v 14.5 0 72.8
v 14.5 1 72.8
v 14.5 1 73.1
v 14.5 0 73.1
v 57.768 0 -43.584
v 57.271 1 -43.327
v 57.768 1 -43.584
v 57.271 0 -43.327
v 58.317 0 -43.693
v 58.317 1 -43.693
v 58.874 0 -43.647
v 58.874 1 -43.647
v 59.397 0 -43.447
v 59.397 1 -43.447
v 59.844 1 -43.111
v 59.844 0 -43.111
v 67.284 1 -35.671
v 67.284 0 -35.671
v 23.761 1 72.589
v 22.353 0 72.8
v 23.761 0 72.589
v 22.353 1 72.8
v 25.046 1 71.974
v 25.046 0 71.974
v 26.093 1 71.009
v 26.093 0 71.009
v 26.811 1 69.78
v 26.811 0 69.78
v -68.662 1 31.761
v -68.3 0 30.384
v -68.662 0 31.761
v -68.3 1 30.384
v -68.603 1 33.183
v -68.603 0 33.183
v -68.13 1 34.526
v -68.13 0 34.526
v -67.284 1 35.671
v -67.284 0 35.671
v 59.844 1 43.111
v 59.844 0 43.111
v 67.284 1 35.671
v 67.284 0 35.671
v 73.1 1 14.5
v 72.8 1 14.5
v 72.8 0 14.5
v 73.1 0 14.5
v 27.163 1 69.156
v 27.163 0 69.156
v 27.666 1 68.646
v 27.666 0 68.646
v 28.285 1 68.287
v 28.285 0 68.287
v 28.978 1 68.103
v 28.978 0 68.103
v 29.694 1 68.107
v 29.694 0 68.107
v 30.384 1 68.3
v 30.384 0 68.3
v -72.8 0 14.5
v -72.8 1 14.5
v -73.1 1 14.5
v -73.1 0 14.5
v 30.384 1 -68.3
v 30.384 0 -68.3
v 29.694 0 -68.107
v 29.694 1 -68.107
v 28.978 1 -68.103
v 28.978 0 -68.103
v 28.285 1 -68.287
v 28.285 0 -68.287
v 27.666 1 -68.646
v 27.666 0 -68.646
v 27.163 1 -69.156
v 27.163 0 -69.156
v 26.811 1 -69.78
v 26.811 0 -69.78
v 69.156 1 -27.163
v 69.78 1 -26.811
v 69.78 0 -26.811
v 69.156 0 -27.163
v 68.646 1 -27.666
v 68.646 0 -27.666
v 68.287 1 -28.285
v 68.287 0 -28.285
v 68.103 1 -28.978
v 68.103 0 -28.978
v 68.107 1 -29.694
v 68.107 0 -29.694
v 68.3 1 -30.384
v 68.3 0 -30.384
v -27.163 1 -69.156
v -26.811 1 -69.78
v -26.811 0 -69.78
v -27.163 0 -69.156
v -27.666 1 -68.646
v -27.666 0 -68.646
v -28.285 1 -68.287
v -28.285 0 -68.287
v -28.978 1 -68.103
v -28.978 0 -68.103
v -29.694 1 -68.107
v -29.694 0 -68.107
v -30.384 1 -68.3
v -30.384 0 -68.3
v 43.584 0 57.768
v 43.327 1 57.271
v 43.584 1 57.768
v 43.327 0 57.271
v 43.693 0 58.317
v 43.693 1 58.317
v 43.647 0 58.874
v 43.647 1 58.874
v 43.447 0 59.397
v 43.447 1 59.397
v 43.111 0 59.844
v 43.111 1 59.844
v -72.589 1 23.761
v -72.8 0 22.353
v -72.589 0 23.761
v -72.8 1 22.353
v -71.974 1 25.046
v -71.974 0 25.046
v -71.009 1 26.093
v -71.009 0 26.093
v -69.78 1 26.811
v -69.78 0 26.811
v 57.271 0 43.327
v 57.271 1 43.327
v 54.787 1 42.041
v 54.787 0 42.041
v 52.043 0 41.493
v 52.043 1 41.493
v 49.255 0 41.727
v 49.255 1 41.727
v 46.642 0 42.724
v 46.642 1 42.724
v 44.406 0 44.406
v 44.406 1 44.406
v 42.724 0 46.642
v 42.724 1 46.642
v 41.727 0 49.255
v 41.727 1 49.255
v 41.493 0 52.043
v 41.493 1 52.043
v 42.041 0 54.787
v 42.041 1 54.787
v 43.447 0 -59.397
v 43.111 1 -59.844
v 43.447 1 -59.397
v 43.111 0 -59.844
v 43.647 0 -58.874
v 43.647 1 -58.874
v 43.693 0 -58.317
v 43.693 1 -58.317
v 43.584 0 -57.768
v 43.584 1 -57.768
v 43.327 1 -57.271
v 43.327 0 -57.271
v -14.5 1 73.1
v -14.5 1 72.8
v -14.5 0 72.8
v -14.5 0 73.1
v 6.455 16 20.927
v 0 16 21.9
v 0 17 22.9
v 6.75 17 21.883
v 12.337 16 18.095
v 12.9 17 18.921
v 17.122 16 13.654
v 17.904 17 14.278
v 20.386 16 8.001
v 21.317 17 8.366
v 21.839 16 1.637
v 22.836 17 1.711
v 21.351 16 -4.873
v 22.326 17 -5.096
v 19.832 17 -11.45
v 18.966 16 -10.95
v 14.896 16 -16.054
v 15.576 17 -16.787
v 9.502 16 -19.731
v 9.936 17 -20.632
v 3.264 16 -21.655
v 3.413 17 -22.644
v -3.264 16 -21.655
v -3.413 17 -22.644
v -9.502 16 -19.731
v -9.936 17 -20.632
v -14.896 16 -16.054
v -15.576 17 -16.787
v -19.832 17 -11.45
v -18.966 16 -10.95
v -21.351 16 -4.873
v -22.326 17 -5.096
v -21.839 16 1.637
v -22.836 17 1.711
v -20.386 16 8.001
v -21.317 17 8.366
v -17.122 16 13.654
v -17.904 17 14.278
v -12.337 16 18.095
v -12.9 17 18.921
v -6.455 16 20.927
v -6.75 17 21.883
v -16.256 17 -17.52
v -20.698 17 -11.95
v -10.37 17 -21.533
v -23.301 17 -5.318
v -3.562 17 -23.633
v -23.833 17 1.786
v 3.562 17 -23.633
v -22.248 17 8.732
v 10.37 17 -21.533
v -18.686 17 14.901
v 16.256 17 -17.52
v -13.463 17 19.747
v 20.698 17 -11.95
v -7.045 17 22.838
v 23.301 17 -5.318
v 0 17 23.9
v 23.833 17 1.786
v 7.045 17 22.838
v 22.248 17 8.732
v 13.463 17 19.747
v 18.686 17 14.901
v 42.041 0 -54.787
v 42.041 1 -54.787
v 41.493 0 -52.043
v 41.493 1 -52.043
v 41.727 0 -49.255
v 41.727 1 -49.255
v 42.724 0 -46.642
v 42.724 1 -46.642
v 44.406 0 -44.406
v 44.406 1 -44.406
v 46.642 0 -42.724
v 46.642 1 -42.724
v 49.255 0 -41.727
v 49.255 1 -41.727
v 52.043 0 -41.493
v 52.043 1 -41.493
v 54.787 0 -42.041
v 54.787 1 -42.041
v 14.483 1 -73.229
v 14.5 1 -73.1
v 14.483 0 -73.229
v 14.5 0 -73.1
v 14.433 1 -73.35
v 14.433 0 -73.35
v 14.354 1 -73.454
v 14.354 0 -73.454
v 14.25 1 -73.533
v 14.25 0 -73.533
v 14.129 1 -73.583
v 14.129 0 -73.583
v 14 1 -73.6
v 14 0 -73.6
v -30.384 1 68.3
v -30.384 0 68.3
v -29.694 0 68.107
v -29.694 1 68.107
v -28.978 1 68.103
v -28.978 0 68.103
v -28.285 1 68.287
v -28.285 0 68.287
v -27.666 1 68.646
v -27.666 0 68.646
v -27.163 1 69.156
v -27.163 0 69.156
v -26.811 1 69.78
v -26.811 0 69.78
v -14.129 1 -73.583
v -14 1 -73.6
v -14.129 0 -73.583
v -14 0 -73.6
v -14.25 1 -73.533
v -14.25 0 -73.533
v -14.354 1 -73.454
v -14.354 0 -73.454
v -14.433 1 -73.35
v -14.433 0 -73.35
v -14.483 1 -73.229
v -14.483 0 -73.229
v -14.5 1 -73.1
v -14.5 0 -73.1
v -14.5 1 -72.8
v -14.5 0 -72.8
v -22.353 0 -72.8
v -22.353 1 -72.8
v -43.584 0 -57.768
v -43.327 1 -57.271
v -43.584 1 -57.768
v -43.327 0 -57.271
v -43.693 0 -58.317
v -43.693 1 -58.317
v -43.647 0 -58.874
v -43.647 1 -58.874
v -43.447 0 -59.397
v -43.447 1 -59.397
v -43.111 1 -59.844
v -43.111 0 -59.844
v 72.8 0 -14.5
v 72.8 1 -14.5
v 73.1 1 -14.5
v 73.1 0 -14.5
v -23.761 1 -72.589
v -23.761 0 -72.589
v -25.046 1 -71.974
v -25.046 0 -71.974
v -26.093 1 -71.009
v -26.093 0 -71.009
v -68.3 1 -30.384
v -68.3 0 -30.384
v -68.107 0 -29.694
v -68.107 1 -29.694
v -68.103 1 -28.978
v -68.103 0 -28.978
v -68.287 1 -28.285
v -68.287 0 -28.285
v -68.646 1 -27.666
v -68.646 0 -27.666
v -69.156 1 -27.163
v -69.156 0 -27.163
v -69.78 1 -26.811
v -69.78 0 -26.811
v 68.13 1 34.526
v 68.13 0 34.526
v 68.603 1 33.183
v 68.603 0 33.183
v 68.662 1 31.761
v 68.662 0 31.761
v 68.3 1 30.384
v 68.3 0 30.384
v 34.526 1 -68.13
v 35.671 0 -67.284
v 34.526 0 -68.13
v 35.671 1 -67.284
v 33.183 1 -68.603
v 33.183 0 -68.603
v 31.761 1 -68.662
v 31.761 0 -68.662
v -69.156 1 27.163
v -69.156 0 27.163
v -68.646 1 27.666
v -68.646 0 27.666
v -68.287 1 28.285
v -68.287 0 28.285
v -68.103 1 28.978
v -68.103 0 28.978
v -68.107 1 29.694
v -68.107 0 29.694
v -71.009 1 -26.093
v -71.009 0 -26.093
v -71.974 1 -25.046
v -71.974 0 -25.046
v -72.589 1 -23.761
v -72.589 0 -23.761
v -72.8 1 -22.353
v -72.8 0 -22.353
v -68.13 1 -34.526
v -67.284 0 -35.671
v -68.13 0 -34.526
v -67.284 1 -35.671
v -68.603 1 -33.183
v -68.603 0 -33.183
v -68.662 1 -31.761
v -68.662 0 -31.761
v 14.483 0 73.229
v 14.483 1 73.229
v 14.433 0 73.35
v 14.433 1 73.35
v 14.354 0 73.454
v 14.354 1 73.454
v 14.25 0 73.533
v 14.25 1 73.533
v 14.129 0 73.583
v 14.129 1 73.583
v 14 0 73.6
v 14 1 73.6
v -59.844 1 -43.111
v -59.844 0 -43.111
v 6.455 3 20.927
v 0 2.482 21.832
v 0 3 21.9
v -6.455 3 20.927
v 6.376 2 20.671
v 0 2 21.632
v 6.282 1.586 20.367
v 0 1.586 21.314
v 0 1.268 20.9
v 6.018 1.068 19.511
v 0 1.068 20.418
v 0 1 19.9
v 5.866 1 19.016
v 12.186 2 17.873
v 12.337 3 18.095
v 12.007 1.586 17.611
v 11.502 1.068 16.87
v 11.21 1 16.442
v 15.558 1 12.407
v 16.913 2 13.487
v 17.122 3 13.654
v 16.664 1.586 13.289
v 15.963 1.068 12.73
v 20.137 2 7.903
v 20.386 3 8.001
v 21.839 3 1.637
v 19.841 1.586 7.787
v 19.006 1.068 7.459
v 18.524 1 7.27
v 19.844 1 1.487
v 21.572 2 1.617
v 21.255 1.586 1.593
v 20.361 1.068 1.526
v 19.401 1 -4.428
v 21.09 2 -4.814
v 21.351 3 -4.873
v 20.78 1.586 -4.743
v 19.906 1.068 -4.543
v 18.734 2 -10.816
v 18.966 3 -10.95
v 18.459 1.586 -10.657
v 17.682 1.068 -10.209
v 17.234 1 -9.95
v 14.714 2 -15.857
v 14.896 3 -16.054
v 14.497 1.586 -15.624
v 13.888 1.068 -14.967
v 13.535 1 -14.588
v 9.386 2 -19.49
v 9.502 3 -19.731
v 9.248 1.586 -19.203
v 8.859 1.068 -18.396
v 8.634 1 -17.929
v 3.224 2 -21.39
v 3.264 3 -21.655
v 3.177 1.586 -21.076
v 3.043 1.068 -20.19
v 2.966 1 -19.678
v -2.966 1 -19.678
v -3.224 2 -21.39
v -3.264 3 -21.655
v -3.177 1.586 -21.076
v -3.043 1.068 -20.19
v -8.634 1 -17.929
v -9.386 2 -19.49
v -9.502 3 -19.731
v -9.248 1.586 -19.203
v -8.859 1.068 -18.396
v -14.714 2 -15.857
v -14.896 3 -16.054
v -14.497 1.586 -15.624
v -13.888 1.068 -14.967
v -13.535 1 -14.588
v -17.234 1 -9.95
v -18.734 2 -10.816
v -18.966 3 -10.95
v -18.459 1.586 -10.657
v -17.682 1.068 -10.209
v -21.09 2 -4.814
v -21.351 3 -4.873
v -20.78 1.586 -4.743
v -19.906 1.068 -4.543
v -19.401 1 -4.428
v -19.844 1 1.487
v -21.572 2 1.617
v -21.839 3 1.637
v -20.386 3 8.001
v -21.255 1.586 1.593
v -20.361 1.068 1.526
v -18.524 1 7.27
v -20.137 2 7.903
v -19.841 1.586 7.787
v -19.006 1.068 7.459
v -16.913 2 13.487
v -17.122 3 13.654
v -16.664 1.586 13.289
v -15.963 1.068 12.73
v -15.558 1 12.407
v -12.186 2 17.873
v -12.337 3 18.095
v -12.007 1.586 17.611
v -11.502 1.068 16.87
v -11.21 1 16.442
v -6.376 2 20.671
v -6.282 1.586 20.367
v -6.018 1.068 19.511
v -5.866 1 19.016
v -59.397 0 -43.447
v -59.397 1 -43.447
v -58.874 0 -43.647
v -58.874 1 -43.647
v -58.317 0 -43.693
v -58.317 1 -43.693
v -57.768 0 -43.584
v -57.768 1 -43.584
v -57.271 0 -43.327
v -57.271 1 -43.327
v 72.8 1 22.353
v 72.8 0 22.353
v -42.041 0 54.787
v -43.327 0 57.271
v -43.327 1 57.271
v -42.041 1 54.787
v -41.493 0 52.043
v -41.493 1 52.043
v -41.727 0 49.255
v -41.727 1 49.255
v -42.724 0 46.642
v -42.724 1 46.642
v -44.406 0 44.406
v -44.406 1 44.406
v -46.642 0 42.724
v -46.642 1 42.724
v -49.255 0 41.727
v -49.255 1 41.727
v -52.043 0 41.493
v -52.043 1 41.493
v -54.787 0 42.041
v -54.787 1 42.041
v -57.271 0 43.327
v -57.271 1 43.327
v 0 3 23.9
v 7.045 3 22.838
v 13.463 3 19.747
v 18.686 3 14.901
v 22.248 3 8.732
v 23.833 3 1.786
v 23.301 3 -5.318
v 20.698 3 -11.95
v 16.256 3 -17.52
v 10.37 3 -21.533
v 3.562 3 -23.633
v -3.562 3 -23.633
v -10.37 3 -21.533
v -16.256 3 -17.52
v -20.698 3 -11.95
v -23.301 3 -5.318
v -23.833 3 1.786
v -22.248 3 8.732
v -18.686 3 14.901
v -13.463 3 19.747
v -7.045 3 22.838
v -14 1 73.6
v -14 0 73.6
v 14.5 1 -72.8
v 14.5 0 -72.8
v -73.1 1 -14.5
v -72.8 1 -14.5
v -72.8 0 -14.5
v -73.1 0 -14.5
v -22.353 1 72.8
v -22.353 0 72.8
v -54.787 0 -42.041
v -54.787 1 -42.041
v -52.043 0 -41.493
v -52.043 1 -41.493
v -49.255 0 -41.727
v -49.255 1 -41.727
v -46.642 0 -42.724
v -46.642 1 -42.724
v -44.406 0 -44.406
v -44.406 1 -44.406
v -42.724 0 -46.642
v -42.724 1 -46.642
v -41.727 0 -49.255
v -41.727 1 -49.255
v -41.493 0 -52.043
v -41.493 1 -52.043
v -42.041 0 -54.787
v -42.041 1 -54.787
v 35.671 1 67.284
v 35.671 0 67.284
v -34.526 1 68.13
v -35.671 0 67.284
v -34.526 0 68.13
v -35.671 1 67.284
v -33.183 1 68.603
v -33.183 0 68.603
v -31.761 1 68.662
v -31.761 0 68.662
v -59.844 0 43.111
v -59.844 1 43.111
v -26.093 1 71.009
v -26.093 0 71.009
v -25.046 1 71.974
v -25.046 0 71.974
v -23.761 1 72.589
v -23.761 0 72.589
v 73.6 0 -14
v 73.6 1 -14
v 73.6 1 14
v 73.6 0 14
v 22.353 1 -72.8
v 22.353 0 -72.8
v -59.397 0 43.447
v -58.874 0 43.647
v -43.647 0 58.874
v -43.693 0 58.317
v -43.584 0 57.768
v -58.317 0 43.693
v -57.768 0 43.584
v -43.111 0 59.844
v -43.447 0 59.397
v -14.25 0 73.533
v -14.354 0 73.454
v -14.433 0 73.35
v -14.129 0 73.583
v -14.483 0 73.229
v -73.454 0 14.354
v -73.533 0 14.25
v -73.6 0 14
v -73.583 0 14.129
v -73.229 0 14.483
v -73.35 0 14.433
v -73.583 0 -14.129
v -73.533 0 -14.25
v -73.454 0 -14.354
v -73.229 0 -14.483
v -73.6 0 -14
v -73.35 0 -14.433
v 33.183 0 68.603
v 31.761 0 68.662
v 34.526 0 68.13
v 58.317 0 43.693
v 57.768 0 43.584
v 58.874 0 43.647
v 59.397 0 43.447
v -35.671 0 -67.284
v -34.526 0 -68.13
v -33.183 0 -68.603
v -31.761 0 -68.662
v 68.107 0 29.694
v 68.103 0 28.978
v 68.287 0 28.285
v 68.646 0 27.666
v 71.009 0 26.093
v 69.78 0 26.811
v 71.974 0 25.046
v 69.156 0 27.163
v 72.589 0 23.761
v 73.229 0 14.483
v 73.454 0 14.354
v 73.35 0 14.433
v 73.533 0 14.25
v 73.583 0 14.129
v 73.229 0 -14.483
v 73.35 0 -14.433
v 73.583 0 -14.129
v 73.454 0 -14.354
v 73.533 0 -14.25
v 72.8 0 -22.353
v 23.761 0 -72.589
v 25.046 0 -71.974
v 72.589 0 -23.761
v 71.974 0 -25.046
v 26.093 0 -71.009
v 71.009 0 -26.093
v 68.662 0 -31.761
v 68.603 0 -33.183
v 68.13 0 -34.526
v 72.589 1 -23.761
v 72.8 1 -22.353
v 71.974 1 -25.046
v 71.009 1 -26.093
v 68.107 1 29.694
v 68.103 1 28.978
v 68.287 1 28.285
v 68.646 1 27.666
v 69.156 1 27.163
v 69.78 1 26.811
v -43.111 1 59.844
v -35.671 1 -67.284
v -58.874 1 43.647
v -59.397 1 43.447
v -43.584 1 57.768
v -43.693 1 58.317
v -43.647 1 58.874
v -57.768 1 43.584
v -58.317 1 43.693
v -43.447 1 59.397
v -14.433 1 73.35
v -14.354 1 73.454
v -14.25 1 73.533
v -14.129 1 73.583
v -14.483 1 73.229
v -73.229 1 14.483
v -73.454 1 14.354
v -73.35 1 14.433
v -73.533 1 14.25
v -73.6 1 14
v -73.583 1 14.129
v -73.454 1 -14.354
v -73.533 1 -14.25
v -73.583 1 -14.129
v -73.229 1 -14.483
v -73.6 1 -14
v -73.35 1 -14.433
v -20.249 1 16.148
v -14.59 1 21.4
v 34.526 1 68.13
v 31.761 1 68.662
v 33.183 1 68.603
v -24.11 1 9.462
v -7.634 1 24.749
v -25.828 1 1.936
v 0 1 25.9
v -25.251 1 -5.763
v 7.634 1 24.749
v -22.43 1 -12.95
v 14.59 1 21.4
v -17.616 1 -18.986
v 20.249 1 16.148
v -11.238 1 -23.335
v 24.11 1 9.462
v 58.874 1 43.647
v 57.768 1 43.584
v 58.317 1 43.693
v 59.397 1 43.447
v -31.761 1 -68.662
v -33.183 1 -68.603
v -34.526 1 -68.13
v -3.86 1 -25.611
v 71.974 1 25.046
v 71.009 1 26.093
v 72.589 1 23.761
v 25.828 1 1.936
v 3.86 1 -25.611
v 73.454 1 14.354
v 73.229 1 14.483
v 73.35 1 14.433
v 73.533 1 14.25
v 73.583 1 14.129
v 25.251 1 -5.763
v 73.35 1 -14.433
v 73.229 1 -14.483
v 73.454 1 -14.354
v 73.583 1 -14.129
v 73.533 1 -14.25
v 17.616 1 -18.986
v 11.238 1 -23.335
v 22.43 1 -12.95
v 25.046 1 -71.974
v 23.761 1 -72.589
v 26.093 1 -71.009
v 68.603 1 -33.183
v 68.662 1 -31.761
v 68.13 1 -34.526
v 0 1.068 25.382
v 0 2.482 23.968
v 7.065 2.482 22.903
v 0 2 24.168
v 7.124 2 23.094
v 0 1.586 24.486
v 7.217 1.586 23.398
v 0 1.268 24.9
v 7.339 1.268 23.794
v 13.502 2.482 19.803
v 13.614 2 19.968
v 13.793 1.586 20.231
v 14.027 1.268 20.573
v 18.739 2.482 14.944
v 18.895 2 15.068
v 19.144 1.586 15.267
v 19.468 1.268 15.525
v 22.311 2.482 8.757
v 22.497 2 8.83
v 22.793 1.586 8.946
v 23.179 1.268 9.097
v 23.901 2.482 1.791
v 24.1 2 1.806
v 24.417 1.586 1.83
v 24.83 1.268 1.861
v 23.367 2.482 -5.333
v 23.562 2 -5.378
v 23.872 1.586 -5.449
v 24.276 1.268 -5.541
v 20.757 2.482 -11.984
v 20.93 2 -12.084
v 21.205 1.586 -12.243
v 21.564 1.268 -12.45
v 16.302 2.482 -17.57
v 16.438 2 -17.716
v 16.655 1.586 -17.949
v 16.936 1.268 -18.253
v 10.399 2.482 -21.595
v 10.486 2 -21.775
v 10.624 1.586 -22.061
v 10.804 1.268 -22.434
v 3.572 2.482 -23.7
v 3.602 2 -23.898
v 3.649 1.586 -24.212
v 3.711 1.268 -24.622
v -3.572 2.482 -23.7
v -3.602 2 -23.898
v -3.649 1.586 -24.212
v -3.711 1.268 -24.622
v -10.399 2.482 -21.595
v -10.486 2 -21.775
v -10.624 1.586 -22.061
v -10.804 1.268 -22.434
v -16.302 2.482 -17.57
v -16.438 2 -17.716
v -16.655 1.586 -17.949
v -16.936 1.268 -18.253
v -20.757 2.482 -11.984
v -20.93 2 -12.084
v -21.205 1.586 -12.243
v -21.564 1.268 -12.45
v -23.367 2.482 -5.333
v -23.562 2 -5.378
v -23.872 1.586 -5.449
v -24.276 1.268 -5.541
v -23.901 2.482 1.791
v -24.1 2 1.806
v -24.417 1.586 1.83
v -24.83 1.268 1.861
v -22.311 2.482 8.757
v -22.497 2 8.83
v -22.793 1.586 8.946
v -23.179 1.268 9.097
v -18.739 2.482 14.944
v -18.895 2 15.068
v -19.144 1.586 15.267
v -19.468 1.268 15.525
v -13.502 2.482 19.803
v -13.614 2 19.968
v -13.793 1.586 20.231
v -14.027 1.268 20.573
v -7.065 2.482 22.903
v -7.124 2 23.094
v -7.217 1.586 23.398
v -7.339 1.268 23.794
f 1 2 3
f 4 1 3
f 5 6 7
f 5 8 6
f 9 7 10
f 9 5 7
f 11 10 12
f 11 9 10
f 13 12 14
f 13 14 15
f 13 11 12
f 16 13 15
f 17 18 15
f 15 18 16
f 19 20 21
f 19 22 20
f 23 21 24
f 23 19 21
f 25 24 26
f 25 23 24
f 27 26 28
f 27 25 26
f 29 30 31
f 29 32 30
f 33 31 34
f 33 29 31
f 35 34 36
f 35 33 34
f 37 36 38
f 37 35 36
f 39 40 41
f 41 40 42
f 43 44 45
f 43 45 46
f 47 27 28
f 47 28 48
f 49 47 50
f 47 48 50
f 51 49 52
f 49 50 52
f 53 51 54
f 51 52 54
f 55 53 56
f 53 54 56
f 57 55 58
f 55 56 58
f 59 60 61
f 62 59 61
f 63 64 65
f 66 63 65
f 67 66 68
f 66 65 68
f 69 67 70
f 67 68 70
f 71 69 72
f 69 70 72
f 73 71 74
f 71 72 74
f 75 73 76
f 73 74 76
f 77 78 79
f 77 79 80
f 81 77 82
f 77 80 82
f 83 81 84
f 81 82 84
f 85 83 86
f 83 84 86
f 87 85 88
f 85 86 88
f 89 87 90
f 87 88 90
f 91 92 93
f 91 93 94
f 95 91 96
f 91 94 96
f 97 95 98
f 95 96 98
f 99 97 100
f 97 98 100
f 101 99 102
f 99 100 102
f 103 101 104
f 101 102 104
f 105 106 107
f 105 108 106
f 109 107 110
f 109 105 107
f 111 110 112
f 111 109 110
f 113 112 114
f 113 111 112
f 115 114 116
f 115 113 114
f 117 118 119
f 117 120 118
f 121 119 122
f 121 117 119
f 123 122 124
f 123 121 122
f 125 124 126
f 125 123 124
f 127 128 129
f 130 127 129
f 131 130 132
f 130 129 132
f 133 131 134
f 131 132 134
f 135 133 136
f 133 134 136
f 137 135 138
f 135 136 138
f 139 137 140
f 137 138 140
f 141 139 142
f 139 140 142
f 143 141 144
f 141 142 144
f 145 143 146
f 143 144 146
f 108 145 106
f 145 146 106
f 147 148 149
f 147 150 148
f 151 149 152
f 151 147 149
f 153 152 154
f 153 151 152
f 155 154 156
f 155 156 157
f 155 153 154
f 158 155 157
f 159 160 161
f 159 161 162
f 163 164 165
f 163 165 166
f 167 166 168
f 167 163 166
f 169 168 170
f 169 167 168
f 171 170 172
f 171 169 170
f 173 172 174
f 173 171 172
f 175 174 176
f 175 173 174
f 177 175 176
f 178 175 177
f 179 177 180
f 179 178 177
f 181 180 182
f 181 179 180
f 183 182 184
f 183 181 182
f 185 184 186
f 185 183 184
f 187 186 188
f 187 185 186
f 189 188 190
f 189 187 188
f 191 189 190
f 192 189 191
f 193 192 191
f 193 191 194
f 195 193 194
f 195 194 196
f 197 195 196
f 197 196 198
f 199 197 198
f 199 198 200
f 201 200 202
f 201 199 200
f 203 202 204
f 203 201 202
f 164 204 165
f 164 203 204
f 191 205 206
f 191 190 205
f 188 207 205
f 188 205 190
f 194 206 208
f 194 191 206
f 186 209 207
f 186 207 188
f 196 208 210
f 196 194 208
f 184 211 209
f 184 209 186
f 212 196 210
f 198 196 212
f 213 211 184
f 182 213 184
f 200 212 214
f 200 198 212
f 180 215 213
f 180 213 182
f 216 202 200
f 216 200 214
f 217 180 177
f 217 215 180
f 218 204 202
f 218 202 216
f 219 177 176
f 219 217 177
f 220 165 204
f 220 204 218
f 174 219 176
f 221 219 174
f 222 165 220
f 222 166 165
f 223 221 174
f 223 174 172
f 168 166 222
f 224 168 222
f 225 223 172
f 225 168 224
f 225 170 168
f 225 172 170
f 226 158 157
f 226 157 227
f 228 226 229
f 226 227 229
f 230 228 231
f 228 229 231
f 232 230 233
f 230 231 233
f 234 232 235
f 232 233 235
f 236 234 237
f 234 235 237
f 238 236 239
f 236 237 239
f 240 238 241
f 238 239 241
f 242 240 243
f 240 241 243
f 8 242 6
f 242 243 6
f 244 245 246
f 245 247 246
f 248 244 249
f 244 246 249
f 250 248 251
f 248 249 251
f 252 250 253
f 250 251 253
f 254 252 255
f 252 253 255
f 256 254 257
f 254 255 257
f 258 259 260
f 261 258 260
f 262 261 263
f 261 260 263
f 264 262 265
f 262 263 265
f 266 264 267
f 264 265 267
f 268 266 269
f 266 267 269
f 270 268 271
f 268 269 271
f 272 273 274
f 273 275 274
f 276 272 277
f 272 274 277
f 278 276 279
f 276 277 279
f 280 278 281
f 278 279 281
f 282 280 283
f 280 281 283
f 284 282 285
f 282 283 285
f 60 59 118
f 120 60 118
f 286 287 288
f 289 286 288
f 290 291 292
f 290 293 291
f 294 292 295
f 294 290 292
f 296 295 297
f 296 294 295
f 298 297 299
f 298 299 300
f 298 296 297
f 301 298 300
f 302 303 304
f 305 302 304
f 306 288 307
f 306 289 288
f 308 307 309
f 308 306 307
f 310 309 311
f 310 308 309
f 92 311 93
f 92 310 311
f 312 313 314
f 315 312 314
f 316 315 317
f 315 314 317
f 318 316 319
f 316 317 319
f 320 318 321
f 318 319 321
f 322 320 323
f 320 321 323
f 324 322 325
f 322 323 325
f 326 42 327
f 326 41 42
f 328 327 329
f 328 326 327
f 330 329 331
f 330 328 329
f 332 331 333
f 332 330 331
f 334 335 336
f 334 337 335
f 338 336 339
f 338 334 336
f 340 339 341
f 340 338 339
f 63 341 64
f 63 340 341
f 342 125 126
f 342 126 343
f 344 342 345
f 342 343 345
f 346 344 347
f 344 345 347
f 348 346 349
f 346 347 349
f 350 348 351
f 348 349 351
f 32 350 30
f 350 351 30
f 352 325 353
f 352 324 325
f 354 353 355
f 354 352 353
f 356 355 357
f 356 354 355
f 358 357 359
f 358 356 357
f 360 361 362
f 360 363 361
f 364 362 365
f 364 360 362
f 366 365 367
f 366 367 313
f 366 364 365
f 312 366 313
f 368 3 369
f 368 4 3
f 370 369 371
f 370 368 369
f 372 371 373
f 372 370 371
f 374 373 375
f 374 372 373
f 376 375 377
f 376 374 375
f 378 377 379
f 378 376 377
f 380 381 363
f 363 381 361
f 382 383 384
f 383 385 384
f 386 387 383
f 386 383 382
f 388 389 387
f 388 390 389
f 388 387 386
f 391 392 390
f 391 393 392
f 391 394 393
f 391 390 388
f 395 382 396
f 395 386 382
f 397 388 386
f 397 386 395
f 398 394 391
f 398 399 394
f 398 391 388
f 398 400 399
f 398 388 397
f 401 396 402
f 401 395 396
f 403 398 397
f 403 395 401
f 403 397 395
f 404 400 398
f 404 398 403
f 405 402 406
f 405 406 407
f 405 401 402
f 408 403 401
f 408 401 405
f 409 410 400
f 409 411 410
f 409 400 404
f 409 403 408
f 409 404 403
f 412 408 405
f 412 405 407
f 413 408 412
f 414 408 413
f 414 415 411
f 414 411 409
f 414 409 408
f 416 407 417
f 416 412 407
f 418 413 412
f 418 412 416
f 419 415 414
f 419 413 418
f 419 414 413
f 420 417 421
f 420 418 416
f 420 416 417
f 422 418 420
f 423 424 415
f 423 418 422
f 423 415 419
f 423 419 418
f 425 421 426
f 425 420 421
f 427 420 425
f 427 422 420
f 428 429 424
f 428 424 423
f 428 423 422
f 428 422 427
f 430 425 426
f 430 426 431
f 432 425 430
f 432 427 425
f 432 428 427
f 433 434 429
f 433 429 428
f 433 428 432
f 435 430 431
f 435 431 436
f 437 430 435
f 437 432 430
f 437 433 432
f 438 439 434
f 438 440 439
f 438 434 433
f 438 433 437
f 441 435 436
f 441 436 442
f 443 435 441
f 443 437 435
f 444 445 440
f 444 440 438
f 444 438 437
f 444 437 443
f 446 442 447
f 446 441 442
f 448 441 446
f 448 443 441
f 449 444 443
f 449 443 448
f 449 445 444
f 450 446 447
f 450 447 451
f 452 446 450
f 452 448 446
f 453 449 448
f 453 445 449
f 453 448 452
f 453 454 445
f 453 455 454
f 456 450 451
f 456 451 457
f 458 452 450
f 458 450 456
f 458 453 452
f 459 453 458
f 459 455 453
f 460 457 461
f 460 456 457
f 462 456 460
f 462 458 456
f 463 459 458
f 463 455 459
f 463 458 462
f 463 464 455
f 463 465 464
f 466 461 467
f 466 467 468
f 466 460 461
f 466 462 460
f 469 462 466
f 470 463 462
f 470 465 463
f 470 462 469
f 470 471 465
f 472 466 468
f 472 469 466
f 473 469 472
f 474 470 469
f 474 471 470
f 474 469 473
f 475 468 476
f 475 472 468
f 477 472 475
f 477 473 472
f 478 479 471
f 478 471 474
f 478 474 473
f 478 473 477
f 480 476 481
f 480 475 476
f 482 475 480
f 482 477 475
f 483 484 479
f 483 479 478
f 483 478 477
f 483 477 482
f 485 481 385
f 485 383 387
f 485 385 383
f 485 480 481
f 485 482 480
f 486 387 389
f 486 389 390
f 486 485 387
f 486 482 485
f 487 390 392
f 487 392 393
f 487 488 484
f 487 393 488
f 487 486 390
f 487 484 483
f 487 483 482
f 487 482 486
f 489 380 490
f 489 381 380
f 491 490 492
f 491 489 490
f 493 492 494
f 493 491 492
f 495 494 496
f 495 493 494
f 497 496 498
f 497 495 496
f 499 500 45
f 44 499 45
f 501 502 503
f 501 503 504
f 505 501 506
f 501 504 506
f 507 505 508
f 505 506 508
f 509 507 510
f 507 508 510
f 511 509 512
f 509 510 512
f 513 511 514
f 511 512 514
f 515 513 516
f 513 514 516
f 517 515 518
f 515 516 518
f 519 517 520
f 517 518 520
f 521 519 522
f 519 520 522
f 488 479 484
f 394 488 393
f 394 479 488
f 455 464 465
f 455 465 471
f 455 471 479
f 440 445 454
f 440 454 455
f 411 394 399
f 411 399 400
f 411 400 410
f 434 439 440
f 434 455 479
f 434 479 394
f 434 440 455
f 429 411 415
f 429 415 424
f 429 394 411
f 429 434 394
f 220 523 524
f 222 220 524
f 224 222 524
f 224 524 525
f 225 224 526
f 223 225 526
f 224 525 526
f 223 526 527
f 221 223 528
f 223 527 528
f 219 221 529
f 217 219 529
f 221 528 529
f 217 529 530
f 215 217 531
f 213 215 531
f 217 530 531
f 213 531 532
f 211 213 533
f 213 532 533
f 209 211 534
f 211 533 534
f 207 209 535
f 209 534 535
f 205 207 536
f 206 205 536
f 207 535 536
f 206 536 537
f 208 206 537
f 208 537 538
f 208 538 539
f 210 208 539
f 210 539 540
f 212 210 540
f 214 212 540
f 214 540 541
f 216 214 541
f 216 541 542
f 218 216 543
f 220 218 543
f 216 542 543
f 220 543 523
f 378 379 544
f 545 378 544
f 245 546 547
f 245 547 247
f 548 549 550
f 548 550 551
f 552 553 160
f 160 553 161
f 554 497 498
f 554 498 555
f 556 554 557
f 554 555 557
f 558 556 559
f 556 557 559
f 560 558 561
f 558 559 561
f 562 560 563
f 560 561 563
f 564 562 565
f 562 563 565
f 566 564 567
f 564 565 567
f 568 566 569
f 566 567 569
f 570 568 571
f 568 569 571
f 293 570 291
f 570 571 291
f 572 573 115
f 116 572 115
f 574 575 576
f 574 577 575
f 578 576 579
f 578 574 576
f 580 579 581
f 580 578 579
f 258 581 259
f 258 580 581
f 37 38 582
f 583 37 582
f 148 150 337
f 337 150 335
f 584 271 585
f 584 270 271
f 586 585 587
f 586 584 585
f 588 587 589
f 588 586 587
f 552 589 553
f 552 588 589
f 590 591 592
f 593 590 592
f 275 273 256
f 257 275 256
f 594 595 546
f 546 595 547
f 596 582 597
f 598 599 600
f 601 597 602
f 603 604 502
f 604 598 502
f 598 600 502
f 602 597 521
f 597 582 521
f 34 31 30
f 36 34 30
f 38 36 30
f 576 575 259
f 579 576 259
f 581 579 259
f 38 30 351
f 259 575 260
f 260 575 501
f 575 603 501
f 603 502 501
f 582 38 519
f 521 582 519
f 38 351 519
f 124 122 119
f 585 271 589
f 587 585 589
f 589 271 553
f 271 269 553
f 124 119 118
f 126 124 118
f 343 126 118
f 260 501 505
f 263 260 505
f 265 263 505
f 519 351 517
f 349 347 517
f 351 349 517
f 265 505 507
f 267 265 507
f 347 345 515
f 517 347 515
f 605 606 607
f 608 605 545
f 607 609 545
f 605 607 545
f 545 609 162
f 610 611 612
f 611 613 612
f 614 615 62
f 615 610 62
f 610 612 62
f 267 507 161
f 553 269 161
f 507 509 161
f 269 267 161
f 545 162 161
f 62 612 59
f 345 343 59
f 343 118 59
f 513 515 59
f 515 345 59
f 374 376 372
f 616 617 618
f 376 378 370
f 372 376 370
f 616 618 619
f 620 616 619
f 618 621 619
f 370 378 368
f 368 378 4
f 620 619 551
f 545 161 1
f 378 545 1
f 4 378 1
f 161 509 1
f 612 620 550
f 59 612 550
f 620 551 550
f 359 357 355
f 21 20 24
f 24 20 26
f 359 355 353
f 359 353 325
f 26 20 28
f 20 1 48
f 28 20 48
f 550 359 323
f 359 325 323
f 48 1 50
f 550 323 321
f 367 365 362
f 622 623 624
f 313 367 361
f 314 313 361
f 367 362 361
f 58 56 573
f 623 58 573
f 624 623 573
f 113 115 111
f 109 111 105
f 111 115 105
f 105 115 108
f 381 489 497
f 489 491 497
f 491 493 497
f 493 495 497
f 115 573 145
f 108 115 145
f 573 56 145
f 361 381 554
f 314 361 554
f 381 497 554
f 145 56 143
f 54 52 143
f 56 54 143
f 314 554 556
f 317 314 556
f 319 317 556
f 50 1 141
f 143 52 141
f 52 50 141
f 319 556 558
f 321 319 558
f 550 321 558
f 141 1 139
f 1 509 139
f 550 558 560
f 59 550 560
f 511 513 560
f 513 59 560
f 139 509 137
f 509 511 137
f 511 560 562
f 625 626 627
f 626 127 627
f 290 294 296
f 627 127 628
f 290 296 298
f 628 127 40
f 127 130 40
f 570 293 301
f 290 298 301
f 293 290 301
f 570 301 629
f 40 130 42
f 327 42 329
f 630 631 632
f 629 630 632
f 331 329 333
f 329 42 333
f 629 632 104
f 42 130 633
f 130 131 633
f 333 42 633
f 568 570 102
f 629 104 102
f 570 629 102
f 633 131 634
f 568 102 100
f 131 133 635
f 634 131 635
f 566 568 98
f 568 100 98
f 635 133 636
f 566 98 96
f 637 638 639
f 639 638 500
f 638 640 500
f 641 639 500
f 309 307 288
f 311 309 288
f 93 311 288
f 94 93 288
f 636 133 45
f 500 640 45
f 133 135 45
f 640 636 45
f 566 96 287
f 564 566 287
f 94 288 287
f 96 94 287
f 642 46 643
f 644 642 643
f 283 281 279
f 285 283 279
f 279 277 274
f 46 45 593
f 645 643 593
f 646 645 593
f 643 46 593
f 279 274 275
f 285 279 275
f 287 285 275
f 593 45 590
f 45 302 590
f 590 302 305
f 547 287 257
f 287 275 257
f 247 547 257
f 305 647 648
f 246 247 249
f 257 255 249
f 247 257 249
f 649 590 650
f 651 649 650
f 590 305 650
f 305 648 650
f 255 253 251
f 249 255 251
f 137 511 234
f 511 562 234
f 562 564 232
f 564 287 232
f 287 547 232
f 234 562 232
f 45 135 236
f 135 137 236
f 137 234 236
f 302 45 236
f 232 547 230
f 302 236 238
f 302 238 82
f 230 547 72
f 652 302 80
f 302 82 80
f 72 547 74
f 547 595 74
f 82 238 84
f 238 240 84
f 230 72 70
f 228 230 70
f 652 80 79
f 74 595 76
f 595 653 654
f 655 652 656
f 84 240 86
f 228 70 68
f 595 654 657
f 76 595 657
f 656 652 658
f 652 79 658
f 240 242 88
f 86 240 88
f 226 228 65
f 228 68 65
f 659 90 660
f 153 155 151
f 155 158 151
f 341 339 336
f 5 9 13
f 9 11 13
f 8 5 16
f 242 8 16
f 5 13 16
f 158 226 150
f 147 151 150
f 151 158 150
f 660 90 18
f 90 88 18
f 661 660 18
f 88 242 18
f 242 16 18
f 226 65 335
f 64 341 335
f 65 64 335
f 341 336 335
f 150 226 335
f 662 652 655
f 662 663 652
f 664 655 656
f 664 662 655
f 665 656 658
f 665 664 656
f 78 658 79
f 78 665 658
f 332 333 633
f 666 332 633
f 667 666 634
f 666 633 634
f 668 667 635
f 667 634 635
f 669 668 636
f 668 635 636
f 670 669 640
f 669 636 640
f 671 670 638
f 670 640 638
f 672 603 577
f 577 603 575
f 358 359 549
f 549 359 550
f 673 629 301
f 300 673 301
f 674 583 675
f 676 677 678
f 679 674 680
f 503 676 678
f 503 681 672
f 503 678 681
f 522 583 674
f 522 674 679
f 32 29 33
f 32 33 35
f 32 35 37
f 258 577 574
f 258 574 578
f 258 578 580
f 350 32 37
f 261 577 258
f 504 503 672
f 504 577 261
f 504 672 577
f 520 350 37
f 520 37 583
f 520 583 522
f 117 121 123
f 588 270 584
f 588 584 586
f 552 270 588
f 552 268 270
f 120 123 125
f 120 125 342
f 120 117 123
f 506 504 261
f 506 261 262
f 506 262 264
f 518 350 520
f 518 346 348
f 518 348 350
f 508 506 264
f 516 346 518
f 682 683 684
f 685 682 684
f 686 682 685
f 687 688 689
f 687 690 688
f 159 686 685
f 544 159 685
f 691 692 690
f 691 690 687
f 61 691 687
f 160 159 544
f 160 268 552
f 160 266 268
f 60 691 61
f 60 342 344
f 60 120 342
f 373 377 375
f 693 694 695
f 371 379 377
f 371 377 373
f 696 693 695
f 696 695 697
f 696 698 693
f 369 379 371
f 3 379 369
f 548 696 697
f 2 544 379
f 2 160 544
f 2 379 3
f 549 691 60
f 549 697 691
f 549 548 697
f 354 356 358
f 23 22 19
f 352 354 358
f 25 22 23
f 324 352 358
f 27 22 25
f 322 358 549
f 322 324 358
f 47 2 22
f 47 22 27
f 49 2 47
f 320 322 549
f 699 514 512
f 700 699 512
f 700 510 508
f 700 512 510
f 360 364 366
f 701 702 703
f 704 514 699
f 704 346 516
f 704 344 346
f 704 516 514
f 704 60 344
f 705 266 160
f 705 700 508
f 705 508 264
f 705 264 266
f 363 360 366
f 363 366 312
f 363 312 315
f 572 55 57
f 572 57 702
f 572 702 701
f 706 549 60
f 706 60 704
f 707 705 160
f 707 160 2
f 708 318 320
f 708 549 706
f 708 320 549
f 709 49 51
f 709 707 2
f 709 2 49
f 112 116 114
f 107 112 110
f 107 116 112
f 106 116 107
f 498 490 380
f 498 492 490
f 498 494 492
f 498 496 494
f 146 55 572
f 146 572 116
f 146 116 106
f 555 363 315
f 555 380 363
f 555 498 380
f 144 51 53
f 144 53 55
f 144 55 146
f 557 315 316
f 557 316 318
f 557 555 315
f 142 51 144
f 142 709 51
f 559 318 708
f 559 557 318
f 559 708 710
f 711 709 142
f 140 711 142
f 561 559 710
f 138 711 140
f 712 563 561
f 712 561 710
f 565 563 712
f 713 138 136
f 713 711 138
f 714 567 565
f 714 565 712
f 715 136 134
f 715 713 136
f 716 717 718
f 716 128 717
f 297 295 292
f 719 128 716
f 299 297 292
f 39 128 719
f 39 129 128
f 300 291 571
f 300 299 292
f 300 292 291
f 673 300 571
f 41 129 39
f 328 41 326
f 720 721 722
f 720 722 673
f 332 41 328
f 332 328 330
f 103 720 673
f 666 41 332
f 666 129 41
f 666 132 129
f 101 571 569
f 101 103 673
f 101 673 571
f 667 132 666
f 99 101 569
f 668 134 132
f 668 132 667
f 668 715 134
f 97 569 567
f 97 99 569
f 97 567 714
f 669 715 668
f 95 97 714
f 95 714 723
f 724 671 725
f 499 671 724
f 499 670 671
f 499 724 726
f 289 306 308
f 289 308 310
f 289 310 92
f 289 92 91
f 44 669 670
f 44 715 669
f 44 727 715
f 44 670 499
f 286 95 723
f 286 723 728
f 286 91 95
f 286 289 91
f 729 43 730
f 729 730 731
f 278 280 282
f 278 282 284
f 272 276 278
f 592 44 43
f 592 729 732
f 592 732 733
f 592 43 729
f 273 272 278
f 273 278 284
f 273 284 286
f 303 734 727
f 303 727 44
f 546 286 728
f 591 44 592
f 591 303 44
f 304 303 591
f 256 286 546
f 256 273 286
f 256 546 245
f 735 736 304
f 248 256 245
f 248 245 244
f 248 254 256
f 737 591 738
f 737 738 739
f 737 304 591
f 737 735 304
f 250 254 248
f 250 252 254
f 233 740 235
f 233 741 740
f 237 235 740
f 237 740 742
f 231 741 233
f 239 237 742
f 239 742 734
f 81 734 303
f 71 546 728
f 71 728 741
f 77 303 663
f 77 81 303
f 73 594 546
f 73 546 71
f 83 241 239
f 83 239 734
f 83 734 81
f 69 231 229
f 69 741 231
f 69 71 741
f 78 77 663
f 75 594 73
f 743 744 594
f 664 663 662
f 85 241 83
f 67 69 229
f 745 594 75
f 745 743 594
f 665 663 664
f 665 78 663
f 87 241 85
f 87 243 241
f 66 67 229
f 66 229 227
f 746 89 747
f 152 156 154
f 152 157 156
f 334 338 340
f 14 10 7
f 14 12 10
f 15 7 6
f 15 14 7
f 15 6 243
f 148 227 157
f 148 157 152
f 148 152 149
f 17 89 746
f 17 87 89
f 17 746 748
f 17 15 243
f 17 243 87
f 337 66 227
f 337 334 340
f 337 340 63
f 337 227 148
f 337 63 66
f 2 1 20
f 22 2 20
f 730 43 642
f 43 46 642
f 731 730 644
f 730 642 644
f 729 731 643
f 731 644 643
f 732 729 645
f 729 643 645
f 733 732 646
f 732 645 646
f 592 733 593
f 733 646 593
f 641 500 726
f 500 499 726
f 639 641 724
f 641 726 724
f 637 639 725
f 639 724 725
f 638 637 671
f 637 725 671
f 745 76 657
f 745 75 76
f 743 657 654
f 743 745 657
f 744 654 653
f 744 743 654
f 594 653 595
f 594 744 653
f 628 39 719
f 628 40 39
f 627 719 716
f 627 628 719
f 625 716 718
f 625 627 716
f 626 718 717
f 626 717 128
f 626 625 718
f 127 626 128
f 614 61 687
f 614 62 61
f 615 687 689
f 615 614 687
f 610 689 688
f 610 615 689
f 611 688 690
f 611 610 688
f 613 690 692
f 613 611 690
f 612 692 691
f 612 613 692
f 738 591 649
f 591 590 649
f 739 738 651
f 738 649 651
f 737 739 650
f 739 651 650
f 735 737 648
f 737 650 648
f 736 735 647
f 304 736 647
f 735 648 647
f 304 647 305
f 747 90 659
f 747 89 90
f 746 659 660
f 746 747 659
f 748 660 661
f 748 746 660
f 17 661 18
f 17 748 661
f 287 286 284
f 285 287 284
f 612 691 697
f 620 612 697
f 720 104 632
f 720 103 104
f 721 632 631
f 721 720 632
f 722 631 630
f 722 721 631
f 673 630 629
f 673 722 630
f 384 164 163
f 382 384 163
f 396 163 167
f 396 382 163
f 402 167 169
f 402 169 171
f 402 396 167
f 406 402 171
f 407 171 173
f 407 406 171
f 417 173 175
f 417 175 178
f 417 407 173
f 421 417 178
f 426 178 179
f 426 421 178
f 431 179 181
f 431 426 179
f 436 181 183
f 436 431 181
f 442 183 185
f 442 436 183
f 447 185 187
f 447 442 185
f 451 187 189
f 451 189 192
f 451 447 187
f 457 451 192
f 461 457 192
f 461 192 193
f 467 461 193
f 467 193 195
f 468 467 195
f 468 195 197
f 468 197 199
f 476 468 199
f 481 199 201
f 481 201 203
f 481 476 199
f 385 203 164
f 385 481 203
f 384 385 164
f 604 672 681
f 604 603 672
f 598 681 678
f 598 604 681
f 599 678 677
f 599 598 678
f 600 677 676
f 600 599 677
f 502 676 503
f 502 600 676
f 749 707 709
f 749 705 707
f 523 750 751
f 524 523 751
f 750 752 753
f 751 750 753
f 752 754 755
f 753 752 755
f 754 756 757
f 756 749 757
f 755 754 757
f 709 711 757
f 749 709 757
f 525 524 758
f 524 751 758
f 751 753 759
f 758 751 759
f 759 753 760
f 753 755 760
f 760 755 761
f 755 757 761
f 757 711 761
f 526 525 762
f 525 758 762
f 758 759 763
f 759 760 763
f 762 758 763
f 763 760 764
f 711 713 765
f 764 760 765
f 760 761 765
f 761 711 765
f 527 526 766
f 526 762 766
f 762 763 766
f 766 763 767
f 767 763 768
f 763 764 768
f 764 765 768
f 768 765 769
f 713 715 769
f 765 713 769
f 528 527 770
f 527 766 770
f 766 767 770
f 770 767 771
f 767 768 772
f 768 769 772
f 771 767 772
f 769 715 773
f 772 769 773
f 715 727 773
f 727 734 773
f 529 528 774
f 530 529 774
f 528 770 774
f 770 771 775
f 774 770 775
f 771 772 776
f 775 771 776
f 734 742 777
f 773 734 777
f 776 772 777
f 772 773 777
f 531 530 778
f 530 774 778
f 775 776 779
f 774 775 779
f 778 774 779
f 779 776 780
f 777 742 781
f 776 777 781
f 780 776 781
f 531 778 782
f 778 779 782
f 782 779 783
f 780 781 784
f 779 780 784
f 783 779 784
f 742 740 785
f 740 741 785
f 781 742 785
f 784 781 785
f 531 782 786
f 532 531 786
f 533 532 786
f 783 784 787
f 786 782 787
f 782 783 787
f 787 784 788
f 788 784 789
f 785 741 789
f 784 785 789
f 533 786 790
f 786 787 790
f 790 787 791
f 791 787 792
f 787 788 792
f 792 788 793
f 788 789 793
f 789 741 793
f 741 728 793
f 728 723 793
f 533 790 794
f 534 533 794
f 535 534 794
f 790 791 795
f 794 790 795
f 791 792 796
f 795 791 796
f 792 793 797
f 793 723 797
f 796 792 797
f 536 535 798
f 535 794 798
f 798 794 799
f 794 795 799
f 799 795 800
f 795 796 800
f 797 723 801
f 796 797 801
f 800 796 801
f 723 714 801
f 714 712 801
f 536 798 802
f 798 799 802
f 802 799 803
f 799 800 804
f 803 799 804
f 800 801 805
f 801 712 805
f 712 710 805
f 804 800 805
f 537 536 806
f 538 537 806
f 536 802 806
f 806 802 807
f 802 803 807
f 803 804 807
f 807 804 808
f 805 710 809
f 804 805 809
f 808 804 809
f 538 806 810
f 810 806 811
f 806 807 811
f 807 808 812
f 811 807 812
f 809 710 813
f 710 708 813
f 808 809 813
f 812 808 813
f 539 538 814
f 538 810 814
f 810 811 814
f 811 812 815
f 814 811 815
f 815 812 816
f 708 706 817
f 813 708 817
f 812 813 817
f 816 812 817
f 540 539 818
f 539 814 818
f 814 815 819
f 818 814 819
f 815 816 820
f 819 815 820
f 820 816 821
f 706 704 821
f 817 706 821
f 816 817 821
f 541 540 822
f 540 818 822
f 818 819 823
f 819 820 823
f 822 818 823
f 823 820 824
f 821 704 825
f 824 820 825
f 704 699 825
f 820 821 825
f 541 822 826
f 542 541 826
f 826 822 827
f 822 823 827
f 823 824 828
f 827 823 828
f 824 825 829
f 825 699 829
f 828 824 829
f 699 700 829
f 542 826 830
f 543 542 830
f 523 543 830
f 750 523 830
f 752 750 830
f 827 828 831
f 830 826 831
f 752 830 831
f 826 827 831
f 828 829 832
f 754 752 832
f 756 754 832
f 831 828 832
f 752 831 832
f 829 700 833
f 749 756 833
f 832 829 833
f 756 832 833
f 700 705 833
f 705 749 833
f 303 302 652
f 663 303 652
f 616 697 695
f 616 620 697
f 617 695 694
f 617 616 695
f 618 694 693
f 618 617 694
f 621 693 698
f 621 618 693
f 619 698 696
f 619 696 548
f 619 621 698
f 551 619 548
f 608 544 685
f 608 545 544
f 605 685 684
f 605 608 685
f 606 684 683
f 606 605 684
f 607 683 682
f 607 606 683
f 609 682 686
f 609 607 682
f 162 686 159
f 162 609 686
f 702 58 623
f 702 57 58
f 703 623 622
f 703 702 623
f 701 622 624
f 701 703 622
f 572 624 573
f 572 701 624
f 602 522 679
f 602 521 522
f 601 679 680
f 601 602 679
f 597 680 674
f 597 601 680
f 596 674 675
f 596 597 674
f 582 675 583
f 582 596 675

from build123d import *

# Parameters (mm, degrees)
BOSS_EXTRUDE1_DEPTH = 1
FILLET2_R           = 4.8
SKETCH5_W           = 29
SKETCH5_H           = 0.8
BOSS_EXTRUDE2_DEPTH = 1
CUT_EXTRUDE1_REACH  = 105.527
CIRPATTERN1_COUNT   = 4
SKETCH6_R           = 23.9
SKETCH6_R_2         = 21.9
BOSS_EXTRUDE3_DEPTH = 16
FILLET6_R           = 2
CHAMFER1_SIZE       = 1
FILLET5_R           = 2
FILLET7_R           = 0.5


with BuildPart() as part:
    # Sketch4 → Boss-Extrude1 (new body)
    with BuildSketch(Plane(origin=(0, 0, 0), x_dir=(1, 0, 0), z_dir=(0, 1, 0))):
        with BuildLine():
            Line((72.8, -27.525603906), (72.8, 27.525603906))
            ThreePointArc((72.8, 27.525603906), (68.286783321, 28.285311783), (70.940914849, 32.013832492))
            Line((70.940914849, 32.013832492), (32.013832492, 70.940914849))
            ThreePointArc((32.013832492, 70.940914849), (28.285311783, 68.286783321), (27.525603906, 72.8))
            Line((27.525603906, 72.8), (-27.525603906, 72.8))
            ThreePointArc((-27.525603906, 72.8), (-28.285311783, 68.286783321), (-32.013832492, 70.940914849))
            Line((-32.013832492, 70.940914849), (-70.940914849, 32.013832492))
            ThreePointArc((-70.940914849, 32.013832492), (-68.286783321, 28.285311783), (-72.8, 27.525603906))
            Line((-72.8, 27.525603906), (-72.8, -27.525603906))
            ThreePointArc((-72.8, -27.525603906), (-68.286783321, -28.285311783), (-70.940914849, -32.013832492))
            Line((-70.940914849, -32.013832492), (-32.013832492, -70.940914849))
            ThreePointArc((-32.013832492, -70.940914849), (-28.285311783, -68.286783321), (-27.525603906, -72.8))
            Line((-27.525603906, -72.8), (27.525603906, -72.8))
            ThreePointArc((27.525603906, -72.8), (28.285311783, -68.286783321), (32.013832492, -70.940914849))
            Line((32.013832492, -70.940914849), (70.940914849, -32.013832492))
            ThreePointArc((70.940914849, -32.013832492), (68.286783321, -28.285311783), (72.8, -27.525603906))
        make_face()
    extrude(amount=BOSS_EXTRUDE1_DEPTH)

    # Fillet2
    fillet2_edges = [part.edges().sort_by_distance(p)[0] for p in [
        (27.525603906, 0.5, 72.8),
        (-27.525603906, 0.5, 72.8),
        (-32.013832492, 0.5, 70.940914849),
        (-70.940914849, 0.5, 32.013832492),
        (-72.8, 0.5, 27.525603906),
        (-72.8, 0.5, -27.525603906),
        (-70.940914849, 0.5, -32.013832492),
        (-32.013832492, 0.5, -70.940914849),
        (-27.525603906, 0.5, -72.8),
        (27.525603906, 0.5, -72.8),
        (32.013832492, 0.5, -70.940914849),
        (70.940914849, 0.5, -32.013832492),
        (72.8, 0.5, -27.525603906),
        (72.8, 0.5, 27.525603906),
        (70.940914849, 0.5, 32.013832492),
        (32.013832492, 0.5, 70.940914849),
    ]]
    fillet(fillet2_edges, radius=FILLET2_R)

    # Sketch5 → Boss-Extrude2 (add)
    with BuildSketch(Plane(origin=(0, 1, 0), x_dir=(1, 0, 0), z_dir=(0, 1, 0))):
        with Locations((0, 73.2)):
            Rectangle(SKETCH5_W, SKETCH5_H)
    boss_extrude2 = extrude(amount=-BOSS_EXTRUDE2_DEPTH)

    # Sketch7 → Cut-Extrude1 (cut, up to next)
    with BuildSketch(Plane(origin=(0, 1, 0), x_dir=(1, 0, 0), z_dir=(0, 1, 0)), mode=Mode.PRIVATE) as cut_extrude1_sk1:
        with BuildLine():
            Line((58.548441482, 44.406305859), (44.406305859, 58.548441482))
            ThreePointArc((44.406305859, 58.548441482), (44.406305859, 44.406305859), (58.548441482, 44.406305859))
        make_face()
    cut_extrude1_tool1 = extrude(cut_extrude1_sk1.sketch, amount=-CUT_EXTRUDE1_REACH, mode=Mode.PRIVATE) & part.part
    cut_extrude1 = cut_extrude1_tool1.solids().sort_by_distance((48.476319, 1, -48.476319))[0]
    add(cut_extrude1, mode=Mode.SUBTRACT)

    # CirPattern1: Boss-Extrude2, Cut-Extrude1 ×4 about axis
    cirpattern1_axis = Axis((0, 0, 0), (0, 1, 0))
    add([boss_extrude2.rotate(cirpattern1_axis, i * 360 / CIRPATTERN1_COUNT) for i in range(1, CIRPATTERN1_COUNT)])
    add([cut_extrude1.rotate(cirpattern1_axis, i * 360 / CIRPATTERN1_COUNT) for i in range(1, CIRPATTERN1_COUNT)], mode=Mode.SUBTRACT)

    # Sketch6 → Boss-Extrude3 (add)
    with BuildSketch(Plane(origin=(0, 1, 0), x_dir=(1, 0, 0), z_dir=(0, 1, 0))):
        with Locations(Location((0, 0, 0), (0, 0, 270))):
            Circle(SKETCH6_R)
        with Locations(Location((0, 0, 0), (0, 0, 270))):
            Circle(SKETCH6_R_2, mode=Mode.SUBTRACT)
    extrude(amount=BOSS_EXTRUDE3_DEPTH)

    # Fillet6
    fillet6_edges = [part.edges().sort_by_distance(p)[0] for p in [
        (58.548441482, 0.5, -44.406305859),
        (44.406305859, 0.5, -58.548441482),
        (44.406305859, 0.5, 58.548441482),
        (58.548441482, 0.5, 44.406305859),
        (-58.548441482, 0.5, 44.406305859),
        (-44.406305859, 0.5, 58.548441482),
        (-44.406305859, 0.5, -58.548441482),
        (-58.548441482, 0.5, -44.406305859),
    ]]
    fillet(fillet6_edges, radius=FILLET6_R)

    # Chamfer1
    chamfer1_edges = [part.edges().sort_by_distance(p)[0] for p in [
        (0, 17, -21.9),
    ]]
    chamfer(chamfer1_edges, length=CHAMFER1_SIZE)

    # Fillet5
    fillet5_edges = [part.edges().sort_by_distance(p)[0] for p in [
        (0, 1, -21.9),
        (0, 1, -23.9),
    ]]
    fillet(fillet5_edges, radius=FILLET5_R)

    # Fillet7
    fillet7_edges = [part.edges().sort_by_distance(p)[0] for p in [
        (-14.5, 0.5, -73.6),
        (14.5, 0.5, -73.6),
        (73.6, 0.5, -14.5),
        (73.6, 0.5, 14.5),
        (14.5, 0.5, 73.6),
        (-14.5, 0.5, 73.6),
        (-73.6, 0.5, 14.5),
        (-73.6, 0.5, -14.5),
    ]]
    fillet(fillet7_edges, radius=FILLET7_R)


solid = part.part
